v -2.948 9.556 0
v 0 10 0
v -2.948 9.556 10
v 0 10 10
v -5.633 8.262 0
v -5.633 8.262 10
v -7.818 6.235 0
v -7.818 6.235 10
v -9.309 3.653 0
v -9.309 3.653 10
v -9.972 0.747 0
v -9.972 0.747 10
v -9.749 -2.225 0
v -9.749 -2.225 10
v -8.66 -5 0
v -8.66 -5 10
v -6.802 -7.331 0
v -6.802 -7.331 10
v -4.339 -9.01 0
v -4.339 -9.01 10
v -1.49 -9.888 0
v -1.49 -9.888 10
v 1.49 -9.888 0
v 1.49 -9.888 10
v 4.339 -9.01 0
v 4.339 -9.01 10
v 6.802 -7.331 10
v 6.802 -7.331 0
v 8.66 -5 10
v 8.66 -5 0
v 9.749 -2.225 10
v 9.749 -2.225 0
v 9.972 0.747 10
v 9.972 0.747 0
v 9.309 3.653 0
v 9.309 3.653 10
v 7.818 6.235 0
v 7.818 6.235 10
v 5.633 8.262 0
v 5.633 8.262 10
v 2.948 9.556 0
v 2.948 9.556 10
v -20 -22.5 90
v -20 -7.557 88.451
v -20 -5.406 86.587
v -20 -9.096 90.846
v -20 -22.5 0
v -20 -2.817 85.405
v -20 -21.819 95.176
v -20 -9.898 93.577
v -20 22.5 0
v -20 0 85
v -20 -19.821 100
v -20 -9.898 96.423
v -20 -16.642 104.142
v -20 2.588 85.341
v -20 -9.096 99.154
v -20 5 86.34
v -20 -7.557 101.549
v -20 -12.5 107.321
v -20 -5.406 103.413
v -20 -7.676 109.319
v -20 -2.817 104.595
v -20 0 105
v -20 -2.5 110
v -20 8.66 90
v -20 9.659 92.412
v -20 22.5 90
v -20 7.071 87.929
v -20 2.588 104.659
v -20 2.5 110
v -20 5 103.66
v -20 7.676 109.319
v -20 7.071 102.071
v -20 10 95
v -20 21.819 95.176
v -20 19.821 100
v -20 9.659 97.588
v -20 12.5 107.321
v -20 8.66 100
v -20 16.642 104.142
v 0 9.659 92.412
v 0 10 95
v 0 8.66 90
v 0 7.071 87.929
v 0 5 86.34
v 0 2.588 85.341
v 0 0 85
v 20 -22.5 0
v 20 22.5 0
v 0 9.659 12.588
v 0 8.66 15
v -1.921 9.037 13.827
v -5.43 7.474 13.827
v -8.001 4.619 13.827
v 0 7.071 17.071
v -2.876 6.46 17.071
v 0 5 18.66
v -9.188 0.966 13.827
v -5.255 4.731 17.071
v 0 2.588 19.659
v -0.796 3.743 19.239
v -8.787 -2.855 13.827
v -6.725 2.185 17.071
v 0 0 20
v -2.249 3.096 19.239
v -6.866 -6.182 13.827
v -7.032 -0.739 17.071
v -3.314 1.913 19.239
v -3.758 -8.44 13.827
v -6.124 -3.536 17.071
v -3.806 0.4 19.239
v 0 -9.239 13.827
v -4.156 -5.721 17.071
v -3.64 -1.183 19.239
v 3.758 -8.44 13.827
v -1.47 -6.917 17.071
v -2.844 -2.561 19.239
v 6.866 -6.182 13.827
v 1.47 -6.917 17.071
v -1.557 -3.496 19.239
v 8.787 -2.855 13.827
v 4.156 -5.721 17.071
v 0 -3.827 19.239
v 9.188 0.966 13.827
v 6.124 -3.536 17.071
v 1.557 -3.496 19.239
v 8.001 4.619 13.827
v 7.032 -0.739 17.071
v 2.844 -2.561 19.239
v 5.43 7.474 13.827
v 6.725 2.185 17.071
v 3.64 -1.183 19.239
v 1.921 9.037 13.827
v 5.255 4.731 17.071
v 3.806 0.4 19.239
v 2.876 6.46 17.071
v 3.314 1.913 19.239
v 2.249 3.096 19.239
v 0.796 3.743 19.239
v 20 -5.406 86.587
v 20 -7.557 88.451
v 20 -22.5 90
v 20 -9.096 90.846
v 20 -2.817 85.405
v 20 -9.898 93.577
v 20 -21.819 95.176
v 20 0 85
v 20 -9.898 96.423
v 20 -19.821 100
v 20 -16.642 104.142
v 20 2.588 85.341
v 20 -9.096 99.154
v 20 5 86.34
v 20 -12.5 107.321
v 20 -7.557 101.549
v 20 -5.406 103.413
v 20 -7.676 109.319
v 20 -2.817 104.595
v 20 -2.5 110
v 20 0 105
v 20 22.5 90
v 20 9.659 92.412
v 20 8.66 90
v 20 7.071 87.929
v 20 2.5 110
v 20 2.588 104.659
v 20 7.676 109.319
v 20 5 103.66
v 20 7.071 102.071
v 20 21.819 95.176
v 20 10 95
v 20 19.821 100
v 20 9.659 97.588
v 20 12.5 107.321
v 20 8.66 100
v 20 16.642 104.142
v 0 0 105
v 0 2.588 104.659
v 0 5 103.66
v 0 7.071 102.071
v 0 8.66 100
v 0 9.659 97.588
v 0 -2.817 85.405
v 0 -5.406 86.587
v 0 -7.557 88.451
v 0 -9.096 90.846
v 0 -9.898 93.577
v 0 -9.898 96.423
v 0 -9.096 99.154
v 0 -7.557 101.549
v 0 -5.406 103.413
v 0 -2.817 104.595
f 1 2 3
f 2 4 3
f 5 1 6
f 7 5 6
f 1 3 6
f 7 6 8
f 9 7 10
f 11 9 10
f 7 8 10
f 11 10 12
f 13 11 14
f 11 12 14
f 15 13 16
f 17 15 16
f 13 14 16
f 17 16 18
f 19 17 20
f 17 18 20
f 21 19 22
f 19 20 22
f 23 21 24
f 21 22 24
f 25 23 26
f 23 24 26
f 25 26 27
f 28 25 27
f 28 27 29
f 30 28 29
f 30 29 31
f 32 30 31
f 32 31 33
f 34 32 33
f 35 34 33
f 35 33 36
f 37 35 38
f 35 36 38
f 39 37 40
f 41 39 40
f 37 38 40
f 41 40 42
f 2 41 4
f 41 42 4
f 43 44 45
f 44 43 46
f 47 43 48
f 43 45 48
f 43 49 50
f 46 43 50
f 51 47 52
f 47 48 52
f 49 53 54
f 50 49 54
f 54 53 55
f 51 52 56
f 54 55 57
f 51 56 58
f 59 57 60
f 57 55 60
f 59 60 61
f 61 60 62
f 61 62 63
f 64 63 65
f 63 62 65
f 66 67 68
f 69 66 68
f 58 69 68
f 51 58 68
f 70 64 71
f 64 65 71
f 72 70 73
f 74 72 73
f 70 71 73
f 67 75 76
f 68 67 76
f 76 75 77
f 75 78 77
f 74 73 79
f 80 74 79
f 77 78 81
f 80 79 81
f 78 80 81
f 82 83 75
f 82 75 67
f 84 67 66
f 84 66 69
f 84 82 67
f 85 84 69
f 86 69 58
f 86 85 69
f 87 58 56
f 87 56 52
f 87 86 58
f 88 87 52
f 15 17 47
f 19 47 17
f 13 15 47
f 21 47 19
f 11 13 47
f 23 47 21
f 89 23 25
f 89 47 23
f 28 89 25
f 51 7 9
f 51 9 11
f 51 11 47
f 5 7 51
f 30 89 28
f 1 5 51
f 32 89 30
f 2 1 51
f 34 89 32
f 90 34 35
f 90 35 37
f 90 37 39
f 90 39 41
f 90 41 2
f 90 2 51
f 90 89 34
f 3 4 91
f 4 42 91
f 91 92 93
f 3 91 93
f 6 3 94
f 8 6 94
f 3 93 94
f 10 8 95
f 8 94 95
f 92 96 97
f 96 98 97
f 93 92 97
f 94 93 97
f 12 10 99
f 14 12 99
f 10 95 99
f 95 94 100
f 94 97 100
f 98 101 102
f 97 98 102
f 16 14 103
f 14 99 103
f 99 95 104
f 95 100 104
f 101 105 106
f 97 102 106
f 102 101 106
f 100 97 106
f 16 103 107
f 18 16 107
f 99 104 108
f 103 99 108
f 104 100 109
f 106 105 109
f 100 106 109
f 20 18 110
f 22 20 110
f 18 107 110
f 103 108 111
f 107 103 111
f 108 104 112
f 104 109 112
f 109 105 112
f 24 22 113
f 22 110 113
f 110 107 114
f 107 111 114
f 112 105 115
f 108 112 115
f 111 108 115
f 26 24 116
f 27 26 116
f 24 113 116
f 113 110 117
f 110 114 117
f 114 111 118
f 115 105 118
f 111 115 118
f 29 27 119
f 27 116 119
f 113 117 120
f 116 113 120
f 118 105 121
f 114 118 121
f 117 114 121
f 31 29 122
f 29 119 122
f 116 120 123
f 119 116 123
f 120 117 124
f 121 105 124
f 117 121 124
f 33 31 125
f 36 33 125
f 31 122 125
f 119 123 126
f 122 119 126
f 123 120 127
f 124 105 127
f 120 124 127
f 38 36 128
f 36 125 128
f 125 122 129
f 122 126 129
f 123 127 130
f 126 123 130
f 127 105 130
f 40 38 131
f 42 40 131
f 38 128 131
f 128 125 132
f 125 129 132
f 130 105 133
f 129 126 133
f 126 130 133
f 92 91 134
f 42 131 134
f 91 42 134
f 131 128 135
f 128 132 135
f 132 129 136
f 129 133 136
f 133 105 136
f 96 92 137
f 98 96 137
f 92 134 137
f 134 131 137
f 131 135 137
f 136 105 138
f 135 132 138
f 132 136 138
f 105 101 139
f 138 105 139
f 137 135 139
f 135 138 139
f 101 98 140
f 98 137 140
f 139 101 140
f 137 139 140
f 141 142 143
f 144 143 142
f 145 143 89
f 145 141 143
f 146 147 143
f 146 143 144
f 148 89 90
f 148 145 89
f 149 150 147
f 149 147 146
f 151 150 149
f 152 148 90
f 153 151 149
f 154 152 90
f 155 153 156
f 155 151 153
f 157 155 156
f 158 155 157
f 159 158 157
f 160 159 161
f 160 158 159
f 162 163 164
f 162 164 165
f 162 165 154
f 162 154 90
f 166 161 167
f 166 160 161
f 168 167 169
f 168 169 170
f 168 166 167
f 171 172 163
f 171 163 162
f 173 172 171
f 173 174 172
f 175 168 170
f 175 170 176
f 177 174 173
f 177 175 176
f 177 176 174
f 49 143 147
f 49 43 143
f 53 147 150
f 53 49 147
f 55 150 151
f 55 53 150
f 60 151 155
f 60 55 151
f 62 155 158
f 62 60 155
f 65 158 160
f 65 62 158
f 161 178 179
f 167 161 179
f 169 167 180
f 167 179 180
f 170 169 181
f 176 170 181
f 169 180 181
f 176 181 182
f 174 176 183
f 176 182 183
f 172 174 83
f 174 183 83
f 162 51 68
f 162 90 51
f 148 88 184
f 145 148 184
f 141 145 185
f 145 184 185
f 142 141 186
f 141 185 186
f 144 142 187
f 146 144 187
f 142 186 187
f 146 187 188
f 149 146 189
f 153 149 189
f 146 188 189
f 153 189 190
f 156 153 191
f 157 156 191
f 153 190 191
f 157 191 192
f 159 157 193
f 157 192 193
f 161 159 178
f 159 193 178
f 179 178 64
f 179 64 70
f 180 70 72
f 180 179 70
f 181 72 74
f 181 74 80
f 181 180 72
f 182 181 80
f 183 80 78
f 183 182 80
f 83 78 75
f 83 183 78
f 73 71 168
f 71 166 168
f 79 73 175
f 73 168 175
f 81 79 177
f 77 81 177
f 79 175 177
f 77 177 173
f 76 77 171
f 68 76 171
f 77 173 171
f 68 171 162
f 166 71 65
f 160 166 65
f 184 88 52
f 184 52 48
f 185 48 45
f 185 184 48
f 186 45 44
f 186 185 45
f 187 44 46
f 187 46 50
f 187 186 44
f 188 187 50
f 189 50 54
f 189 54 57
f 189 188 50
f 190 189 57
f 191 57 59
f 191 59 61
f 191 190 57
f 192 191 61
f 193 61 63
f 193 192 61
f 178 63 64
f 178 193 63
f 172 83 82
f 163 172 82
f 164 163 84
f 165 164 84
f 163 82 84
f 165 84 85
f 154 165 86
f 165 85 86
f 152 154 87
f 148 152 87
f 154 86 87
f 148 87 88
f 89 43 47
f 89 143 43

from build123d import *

# Parameters (mm, degrees)
F1_DEPTH = 20
F2_R     = 20


with BuildPart() as f1:
    # F0 (on Right) → F1 (new body, symmetric)
    with BuildSketch(Plane.YZ):
        with BuildLine():
            Line((-22.5, 0), (0, 0))
            Line((0, 0), (0, 85))
            ThreePointArc((0, 85), (-10, 95), (0, 105))
            Line((0, 105), (0, 110))
            Line((0, 110), (-22.5, 110))
            Line((-22.5, 110), (-22.5, 0))
        make_face()
        with BuildLine():
            Line((0, 0), (22.5, 0))
            Line((22.5, 0), (22.5, 110))
            Line((22.5, 110), (0, 110))
            Line((0, 110), (0, 105))
            ThreePointArc((0, 105), (7.0710678119, 102.0710678119), (10, 95))
            ThreePointArc((10, 95), (7.0710678119, 87.9289321881), (0, 85))
            Line((0, 85), (0, 0))
        make_face()
    extrude(amount=F1_DEPTH, both=True)

    # F2
    f2_edges = [f1.edges().sort_by_distance(p)[0] for p in [
        (0, -22.5, 110),
        (0, 22.5, 110),
    ]]
    fillet(f2_edges, radius=F2_R)

    # F3 (on Right) → F4 (revolve, cut)
    with BuildSketch(Plane.YZ):
        with BuildLine():
            Line((0, 20), (0, 0))
            Line((0, 0), (0, -5))
            Line((0, -5), (10, -5))
            Line((10, -5), (10, 0))
            Line((10, 0), (10, 10))
            ThreePointArc((10, 10), (7.0710678119, 17.0710678119), (0, 20))
        make_face()
    revolve(axis=Axis((0, 0, 10), (0, 0, 1)), mode=Mode.SUBTRACT)


solid = f1.part
